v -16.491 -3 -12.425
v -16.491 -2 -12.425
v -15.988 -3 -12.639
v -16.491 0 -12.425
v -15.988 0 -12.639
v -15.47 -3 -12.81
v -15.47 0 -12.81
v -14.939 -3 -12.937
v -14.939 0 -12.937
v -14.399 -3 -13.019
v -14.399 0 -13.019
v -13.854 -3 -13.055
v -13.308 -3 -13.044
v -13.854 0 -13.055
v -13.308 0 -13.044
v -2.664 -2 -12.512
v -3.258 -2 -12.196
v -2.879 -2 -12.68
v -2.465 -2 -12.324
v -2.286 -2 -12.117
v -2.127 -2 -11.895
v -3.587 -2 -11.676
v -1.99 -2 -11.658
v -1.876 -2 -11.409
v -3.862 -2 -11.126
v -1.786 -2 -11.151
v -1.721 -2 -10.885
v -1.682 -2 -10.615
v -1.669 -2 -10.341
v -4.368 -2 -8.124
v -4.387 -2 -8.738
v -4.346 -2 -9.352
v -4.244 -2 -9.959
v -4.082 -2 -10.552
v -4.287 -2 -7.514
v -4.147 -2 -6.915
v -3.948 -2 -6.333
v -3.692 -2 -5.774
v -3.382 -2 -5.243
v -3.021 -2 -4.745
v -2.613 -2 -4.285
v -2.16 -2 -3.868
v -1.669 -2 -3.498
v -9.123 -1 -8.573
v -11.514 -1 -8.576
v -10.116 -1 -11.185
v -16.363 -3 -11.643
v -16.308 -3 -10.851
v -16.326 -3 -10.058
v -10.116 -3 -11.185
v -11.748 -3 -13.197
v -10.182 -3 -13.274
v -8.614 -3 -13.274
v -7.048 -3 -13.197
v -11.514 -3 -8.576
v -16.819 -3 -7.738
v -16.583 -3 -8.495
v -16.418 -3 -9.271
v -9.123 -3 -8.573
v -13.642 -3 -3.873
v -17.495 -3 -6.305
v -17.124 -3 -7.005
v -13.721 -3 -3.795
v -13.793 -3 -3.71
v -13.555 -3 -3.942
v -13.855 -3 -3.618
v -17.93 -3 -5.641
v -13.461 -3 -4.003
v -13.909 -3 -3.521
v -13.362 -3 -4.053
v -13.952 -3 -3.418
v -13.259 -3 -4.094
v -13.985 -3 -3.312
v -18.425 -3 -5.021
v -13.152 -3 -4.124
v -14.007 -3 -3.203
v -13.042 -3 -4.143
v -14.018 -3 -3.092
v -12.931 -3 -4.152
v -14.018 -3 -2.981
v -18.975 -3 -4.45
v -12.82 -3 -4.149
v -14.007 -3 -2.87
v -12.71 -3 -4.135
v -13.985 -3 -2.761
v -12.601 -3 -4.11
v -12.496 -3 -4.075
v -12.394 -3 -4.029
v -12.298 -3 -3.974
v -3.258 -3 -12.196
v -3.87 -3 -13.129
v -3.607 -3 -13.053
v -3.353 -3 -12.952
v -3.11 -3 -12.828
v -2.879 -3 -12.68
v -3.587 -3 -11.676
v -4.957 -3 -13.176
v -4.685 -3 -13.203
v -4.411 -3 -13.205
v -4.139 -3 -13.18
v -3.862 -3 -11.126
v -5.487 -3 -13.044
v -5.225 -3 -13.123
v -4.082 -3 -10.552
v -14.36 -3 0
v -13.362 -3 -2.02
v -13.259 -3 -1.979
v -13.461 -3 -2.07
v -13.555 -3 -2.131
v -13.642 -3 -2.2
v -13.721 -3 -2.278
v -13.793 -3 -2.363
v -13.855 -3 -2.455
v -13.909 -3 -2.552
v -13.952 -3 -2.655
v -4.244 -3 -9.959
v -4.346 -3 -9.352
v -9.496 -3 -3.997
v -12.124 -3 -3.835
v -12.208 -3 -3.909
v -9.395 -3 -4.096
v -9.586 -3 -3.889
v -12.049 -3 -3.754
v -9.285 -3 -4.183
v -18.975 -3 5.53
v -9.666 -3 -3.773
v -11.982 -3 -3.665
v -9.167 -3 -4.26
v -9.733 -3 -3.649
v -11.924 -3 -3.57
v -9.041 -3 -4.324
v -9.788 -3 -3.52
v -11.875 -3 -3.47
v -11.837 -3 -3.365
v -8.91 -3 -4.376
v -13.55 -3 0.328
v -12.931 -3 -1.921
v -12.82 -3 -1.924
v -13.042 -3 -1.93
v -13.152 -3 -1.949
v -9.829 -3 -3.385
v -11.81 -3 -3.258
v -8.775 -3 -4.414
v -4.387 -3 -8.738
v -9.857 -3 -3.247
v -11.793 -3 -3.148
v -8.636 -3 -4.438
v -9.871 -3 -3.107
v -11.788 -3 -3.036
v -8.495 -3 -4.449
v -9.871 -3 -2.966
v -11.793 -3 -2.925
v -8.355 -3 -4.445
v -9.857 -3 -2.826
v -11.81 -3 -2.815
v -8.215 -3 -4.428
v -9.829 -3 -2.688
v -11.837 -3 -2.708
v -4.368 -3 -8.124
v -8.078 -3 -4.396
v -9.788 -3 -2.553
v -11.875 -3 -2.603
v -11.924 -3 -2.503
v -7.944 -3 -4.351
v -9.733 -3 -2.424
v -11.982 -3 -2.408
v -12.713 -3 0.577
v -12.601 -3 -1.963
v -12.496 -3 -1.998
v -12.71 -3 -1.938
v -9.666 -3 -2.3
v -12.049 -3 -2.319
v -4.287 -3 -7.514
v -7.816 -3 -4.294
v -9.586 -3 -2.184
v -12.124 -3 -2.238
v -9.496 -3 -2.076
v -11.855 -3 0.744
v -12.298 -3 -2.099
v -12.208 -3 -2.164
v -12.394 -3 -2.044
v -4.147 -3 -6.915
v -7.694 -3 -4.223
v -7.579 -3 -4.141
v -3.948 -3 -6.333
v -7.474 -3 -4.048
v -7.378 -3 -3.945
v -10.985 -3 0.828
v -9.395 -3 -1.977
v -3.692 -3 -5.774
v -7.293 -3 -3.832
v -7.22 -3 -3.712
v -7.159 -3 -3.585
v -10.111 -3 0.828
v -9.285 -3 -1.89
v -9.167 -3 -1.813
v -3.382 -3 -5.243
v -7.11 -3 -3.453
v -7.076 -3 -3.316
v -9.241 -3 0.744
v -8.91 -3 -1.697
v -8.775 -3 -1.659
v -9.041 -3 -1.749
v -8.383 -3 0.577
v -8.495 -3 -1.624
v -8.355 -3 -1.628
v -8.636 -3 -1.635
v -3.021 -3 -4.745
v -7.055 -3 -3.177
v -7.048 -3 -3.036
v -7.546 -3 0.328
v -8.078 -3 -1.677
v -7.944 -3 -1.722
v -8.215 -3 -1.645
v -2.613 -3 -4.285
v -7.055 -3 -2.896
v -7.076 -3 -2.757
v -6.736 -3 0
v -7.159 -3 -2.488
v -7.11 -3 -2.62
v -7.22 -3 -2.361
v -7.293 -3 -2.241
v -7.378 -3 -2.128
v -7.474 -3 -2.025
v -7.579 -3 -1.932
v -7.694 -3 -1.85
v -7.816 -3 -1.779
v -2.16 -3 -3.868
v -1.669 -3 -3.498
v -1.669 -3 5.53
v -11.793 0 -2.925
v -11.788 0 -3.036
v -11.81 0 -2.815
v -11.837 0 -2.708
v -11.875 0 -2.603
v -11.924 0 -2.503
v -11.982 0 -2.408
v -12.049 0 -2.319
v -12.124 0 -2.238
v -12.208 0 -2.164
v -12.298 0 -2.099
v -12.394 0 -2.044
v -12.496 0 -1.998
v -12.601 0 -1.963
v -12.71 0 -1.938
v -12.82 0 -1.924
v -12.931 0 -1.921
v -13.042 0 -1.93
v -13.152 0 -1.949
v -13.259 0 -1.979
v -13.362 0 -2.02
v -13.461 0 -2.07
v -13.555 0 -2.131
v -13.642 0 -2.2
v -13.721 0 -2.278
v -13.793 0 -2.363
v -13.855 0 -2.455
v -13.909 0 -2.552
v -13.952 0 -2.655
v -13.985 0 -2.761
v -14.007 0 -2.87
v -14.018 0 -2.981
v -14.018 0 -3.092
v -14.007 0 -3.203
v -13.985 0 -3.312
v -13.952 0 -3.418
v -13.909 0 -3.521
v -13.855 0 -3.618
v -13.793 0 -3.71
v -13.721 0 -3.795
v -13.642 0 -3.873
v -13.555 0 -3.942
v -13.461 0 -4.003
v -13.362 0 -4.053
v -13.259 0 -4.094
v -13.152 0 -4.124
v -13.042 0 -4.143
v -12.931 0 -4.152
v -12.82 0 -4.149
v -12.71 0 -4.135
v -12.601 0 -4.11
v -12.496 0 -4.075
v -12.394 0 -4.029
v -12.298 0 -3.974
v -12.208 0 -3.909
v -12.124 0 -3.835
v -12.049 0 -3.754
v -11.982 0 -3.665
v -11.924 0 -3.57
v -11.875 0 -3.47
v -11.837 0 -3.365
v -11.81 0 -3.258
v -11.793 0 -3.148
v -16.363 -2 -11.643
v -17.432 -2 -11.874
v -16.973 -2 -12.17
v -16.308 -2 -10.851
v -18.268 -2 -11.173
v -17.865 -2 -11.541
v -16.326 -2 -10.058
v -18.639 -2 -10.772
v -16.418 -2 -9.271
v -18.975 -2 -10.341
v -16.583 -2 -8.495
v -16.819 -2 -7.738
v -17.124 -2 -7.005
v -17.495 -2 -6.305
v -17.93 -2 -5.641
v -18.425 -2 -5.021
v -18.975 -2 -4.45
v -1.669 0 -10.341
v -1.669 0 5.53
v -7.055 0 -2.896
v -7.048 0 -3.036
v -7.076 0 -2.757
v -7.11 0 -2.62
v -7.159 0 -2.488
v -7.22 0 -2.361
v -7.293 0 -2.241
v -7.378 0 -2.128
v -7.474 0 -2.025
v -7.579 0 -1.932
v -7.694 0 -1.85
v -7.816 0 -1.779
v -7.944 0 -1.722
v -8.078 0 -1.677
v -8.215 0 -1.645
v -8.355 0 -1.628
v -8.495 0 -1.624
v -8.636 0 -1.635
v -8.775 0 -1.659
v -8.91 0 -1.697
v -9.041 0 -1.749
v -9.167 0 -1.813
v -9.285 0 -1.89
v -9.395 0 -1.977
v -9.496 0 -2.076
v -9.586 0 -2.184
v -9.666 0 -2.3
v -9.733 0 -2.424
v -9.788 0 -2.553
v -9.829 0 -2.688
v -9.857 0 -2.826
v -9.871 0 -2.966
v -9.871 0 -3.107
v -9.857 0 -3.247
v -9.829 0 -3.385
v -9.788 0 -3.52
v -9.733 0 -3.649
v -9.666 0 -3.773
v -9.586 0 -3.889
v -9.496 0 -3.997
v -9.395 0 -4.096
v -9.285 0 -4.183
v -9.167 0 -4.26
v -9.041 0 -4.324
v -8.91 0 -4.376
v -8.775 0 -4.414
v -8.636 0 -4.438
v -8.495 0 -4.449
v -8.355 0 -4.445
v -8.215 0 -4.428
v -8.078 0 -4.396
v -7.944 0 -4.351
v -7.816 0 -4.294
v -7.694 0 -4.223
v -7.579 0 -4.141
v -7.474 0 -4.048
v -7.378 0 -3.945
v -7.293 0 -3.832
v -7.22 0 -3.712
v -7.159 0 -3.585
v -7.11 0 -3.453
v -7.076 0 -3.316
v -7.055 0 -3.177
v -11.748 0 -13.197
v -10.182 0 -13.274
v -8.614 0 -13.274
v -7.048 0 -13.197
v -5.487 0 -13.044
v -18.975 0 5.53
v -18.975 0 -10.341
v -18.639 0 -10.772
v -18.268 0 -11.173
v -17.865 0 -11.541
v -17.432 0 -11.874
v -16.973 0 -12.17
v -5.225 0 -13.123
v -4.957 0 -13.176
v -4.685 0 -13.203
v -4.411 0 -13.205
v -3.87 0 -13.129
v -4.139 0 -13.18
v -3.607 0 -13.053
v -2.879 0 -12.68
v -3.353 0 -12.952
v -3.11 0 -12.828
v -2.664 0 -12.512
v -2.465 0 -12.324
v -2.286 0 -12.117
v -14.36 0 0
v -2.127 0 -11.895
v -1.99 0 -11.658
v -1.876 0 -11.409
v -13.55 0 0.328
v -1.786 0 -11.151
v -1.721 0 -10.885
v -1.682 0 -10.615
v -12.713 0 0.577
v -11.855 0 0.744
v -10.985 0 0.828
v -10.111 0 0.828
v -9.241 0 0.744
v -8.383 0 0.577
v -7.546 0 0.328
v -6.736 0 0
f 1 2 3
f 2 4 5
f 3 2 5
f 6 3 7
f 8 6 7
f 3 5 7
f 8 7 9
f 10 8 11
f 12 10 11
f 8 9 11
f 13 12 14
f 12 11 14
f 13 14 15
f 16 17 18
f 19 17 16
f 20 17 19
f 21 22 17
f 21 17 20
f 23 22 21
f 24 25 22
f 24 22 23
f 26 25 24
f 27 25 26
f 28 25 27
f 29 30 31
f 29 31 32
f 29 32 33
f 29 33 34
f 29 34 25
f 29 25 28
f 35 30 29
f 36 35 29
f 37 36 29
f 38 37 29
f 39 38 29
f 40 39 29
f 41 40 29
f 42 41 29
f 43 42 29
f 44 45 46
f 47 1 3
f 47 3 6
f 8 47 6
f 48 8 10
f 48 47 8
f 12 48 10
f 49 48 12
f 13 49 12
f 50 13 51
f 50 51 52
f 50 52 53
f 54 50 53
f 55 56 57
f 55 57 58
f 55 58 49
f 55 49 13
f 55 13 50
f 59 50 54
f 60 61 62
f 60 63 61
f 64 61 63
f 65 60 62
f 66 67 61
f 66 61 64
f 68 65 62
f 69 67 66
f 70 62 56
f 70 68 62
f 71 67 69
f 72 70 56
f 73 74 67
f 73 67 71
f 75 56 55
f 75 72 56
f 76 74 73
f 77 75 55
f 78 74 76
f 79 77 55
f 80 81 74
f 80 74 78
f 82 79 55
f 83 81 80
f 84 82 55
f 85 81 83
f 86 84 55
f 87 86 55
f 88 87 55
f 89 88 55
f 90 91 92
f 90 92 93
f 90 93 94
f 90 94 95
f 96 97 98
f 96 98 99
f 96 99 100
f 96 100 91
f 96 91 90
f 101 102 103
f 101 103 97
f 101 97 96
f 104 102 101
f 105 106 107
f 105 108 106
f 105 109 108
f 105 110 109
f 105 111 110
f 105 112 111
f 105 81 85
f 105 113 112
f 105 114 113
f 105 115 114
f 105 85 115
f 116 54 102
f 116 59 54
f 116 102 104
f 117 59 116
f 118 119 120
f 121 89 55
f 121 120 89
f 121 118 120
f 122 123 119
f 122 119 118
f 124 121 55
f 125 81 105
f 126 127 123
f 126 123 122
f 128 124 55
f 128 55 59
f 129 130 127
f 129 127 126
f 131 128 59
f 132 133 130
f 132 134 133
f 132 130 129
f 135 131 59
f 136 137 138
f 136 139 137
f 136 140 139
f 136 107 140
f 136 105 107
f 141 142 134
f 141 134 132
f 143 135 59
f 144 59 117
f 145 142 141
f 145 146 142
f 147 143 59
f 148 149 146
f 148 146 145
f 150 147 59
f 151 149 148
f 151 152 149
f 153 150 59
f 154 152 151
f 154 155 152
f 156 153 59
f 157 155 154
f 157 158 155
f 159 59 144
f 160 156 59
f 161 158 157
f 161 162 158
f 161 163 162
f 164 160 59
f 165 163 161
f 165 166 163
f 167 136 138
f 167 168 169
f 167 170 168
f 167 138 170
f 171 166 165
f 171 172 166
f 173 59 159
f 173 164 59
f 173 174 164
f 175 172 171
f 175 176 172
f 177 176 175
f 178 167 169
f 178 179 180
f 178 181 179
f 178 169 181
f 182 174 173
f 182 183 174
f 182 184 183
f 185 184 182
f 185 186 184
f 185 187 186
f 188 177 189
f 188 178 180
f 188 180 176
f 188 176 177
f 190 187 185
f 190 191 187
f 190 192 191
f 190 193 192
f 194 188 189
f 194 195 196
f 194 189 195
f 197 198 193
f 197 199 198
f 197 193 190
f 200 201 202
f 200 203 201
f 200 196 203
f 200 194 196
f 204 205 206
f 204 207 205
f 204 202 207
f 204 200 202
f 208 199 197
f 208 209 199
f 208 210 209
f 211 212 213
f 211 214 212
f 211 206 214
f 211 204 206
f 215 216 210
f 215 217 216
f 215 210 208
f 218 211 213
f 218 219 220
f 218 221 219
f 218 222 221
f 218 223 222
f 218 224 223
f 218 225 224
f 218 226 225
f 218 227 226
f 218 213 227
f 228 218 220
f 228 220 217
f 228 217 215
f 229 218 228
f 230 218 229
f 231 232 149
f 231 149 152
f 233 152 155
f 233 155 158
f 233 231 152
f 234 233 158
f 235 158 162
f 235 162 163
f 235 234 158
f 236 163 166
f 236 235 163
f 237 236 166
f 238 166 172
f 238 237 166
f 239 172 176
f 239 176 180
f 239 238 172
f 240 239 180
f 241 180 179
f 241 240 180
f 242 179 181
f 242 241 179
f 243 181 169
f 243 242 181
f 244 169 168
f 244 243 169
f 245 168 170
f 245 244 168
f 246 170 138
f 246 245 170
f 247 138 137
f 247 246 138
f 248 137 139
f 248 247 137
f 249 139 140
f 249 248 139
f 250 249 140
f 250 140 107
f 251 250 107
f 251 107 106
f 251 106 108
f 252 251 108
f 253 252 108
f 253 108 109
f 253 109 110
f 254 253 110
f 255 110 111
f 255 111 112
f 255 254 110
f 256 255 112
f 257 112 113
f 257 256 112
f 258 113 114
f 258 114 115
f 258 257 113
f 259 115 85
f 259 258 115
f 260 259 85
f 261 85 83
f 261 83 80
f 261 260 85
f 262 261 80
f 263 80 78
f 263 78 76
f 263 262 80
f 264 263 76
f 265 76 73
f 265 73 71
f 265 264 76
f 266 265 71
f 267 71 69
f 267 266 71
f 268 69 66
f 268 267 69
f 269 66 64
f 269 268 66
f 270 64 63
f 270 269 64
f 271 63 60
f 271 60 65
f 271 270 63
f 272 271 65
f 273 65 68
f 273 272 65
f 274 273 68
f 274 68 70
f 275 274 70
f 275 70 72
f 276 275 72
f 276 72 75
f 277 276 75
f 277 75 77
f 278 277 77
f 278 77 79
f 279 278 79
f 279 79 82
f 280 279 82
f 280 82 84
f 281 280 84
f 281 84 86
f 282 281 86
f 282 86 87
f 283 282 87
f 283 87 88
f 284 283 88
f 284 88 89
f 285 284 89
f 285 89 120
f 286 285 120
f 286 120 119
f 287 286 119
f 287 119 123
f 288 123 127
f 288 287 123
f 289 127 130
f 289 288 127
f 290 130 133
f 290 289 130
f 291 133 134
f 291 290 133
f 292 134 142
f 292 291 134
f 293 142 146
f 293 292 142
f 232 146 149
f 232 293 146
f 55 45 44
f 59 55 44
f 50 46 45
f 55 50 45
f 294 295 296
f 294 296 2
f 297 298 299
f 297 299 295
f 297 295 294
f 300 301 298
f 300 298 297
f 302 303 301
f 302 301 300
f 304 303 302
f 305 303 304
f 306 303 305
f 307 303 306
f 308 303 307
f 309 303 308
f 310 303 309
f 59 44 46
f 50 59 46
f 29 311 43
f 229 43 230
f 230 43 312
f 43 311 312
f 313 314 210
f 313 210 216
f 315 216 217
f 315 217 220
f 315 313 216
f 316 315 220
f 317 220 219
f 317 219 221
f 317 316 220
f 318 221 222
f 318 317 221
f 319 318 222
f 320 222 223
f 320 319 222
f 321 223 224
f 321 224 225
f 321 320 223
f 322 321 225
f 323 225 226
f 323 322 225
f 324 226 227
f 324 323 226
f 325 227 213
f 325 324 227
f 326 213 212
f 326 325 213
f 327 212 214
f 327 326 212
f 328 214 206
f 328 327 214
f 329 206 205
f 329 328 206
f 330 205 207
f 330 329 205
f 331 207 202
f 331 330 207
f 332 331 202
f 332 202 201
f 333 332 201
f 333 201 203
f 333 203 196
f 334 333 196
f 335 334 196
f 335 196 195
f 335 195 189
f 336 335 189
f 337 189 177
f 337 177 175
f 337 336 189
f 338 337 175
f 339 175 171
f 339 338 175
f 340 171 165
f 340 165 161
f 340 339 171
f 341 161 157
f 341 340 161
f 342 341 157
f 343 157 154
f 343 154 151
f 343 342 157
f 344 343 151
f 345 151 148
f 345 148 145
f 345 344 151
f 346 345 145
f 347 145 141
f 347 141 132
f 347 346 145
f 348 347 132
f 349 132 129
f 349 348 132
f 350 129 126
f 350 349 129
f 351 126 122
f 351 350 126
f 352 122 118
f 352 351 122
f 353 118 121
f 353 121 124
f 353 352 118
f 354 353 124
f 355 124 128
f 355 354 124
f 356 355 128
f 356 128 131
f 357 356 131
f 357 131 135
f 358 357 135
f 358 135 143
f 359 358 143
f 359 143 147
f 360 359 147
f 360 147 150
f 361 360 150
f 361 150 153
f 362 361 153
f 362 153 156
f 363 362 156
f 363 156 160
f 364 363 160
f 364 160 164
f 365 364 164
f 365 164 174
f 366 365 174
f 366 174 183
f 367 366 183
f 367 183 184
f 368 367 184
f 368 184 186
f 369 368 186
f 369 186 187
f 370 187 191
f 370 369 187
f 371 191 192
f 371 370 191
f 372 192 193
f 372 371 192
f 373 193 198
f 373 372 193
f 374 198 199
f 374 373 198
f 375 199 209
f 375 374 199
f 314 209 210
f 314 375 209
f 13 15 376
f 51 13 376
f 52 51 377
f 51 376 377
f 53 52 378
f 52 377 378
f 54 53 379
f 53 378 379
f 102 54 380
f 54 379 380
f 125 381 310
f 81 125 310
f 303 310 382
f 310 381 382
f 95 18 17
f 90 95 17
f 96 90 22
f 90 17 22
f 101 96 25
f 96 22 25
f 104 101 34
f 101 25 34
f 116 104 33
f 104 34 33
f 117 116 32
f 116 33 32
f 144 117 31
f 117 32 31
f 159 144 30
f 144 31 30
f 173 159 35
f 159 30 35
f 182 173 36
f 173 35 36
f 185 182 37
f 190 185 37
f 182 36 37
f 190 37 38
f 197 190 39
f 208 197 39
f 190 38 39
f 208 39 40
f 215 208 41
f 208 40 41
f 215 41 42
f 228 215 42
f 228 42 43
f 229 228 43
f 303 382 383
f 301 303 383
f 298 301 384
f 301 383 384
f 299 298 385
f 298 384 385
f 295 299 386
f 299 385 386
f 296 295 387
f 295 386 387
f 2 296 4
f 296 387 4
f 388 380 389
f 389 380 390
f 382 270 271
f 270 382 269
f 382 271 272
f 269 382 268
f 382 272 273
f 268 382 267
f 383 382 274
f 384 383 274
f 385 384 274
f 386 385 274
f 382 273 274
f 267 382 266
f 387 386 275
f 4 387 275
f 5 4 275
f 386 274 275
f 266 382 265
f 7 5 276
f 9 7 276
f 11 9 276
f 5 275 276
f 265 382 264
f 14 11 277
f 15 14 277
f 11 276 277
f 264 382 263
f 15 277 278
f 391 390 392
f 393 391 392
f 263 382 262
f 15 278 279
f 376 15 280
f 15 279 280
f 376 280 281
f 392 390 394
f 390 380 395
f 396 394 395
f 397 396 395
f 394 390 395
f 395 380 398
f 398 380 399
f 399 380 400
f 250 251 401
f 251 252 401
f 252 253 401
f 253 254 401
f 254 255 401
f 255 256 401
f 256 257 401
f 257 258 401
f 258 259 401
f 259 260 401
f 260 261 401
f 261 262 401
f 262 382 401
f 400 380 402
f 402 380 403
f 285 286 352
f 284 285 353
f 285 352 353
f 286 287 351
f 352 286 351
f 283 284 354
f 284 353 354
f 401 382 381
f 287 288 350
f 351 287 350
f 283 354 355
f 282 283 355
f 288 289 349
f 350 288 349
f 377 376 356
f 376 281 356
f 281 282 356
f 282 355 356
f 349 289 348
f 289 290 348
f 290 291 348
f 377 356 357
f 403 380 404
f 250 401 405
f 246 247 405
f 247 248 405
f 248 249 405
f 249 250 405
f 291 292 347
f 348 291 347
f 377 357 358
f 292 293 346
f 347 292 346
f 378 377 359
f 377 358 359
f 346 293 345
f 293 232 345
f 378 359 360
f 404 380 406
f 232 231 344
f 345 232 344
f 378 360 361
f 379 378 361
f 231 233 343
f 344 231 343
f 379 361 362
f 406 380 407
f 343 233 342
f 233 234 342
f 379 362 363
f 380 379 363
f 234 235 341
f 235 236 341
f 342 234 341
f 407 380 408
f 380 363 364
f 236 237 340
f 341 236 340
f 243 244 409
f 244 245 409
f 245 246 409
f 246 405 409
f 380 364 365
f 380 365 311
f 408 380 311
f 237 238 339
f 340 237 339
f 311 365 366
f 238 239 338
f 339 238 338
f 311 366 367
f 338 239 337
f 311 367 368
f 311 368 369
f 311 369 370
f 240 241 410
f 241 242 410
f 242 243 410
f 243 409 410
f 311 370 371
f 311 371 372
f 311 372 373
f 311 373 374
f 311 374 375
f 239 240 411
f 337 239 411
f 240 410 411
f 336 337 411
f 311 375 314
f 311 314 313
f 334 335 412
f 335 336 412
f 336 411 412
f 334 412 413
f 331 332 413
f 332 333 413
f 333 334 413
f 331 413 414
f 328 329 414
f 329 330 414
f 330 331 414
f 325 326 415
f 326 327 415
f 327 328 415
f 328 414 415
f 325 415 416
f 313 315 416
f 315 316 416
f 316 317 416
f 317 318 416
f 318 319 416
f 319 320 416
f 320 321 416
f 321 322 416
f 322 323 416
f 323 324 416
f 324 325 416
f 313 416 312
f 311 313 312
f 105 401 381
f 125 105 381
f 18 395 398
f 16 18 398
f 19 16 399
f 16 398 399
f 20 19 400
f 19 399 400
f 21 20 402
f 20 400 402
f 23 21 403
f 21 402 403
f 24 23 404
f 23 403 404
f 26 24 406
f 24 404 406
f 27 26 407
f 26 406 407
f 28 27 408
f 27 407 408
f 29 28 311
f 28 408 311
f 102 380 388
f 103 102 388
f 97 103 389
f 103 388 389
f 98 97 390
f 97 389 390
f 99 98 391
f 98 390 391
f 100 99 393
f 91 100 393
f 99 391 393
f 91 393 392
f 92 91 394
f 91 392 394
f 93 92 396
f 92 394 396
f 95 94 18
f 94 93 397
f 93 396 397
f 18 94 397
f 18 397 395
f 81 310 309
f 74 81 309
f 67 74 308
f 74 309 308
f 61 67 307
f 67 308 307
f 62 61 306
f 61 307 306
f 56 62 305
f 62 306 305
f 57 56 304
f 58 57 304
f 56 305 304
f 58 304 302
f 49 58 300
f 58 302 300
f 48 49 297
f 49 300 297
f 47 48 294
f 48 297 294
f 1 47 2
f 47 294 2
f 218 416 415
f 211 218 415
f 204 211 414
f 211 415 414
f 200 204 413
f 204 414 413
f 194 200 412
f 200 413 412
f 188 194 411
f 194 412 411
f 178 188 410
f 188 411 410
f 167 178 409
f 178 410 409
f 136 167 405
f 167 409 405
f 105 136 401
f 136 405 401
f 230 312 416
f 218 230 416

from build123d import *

# Parameters (mm, degrees)
F0_R     = 1.115605
F0_R_2   = 1.412634
F1_DEPTH = 3
F2_DEPTH = 2
F3_DEPTH = 1


with BuildPart() as f1:
    # F0 (on Front) → F1 (new body)
    with BuildSketch(Plane.XZ):
        with BuildLine():
            Line((-18.974544, 5.53028), (-18.974544, 3.961724))
            Line((-18.974544, 3.961724), (-18.974544, -4.449865))
            ThreePointArc((-18.974544, -4.449865), (-16.691878, -8.113439), (-16.490631, -12.425264))
            ThreePointArc((-16.490631, -12.425264), (-14.938687, -12.937181), (-13.308015, -13.044414))
            ThreePointArc((-13.308015, -13.044414), (-9.397709, -13.283603), (-5.487403, -13.044414))
            ThreePointArc((-5.487403, -13.044414), (-4.138982, -13.179799), (-2.879113, -12.680498))
            ThreePointArc((-2.879113, -12.680498), (-4.33521, -7.817834), (-1.669094, -3.498396))
            Line((-1.669094, -3.498396), (-1.669094, 5.53028))
            Line((-1.669094, 5.53028), (-6.735639, 0))
            ThreePointArc((-6.735639, 0), (-10.548048, 0.838268), (-14.360456, 0))
            Line((-14.360456, 0), (-18.974544, 5.53028))
        make_face()
        Polygon((-10.116423, -11.184998), (-11.513611, -8.5759), (-9.122775, -8.573417), align=None, mode=Mode.SUBTRACT)
        with Locations((-12.903409, -3.036485)):
            Circle(F0_R, mode=Mode.SUBTRACT)
        with Locations((-8.460215, -3.036485)):
            Circle(F0_R_2, mode=Mode.SUBTRACT)
    extrude(amount=F1_DEPTH)

    # F0 (on Front) → F2 (join)
    with BuildSketch(Plane.XZ):
        with BuildLine():
            ThreePointArc((-16.490631, -12.425264), (-16.691878, -8.113439), (-18.974544, -4.449865))
            Line((-18.974544, -4.449865), (-18.974544, -10.341382))
            ThreePointArc((-18.974544, -10.341382), (-17.865075, -11.541243), (-16.490631, -12.425264))
        make_face()
        with BuildLine():
            ThreePointArc((-1.669094, -3.498396), (-4.33521, -7.817834), (-2.879113, -12.680498))
            ThreePointArc((-2.879113, -12.680498), (-1.989511, -11.658159), (-1.669094, -10.341382))
            Line((-1.669094, -10.341382), (-1.669094, -3.498396))
        make_face()
    extrude(amount=F2_DEPTH)

    # F0 (on Front) → F3 (join)
    with BuildSketch(Plane.XZ):
        Polygon((-9.122775, -8.573417), (-11.513611, -8.5759), (-10.116423, -11.184998), align=None)
    extrude(amount=F3_DEPTH)


solid = f1.part
